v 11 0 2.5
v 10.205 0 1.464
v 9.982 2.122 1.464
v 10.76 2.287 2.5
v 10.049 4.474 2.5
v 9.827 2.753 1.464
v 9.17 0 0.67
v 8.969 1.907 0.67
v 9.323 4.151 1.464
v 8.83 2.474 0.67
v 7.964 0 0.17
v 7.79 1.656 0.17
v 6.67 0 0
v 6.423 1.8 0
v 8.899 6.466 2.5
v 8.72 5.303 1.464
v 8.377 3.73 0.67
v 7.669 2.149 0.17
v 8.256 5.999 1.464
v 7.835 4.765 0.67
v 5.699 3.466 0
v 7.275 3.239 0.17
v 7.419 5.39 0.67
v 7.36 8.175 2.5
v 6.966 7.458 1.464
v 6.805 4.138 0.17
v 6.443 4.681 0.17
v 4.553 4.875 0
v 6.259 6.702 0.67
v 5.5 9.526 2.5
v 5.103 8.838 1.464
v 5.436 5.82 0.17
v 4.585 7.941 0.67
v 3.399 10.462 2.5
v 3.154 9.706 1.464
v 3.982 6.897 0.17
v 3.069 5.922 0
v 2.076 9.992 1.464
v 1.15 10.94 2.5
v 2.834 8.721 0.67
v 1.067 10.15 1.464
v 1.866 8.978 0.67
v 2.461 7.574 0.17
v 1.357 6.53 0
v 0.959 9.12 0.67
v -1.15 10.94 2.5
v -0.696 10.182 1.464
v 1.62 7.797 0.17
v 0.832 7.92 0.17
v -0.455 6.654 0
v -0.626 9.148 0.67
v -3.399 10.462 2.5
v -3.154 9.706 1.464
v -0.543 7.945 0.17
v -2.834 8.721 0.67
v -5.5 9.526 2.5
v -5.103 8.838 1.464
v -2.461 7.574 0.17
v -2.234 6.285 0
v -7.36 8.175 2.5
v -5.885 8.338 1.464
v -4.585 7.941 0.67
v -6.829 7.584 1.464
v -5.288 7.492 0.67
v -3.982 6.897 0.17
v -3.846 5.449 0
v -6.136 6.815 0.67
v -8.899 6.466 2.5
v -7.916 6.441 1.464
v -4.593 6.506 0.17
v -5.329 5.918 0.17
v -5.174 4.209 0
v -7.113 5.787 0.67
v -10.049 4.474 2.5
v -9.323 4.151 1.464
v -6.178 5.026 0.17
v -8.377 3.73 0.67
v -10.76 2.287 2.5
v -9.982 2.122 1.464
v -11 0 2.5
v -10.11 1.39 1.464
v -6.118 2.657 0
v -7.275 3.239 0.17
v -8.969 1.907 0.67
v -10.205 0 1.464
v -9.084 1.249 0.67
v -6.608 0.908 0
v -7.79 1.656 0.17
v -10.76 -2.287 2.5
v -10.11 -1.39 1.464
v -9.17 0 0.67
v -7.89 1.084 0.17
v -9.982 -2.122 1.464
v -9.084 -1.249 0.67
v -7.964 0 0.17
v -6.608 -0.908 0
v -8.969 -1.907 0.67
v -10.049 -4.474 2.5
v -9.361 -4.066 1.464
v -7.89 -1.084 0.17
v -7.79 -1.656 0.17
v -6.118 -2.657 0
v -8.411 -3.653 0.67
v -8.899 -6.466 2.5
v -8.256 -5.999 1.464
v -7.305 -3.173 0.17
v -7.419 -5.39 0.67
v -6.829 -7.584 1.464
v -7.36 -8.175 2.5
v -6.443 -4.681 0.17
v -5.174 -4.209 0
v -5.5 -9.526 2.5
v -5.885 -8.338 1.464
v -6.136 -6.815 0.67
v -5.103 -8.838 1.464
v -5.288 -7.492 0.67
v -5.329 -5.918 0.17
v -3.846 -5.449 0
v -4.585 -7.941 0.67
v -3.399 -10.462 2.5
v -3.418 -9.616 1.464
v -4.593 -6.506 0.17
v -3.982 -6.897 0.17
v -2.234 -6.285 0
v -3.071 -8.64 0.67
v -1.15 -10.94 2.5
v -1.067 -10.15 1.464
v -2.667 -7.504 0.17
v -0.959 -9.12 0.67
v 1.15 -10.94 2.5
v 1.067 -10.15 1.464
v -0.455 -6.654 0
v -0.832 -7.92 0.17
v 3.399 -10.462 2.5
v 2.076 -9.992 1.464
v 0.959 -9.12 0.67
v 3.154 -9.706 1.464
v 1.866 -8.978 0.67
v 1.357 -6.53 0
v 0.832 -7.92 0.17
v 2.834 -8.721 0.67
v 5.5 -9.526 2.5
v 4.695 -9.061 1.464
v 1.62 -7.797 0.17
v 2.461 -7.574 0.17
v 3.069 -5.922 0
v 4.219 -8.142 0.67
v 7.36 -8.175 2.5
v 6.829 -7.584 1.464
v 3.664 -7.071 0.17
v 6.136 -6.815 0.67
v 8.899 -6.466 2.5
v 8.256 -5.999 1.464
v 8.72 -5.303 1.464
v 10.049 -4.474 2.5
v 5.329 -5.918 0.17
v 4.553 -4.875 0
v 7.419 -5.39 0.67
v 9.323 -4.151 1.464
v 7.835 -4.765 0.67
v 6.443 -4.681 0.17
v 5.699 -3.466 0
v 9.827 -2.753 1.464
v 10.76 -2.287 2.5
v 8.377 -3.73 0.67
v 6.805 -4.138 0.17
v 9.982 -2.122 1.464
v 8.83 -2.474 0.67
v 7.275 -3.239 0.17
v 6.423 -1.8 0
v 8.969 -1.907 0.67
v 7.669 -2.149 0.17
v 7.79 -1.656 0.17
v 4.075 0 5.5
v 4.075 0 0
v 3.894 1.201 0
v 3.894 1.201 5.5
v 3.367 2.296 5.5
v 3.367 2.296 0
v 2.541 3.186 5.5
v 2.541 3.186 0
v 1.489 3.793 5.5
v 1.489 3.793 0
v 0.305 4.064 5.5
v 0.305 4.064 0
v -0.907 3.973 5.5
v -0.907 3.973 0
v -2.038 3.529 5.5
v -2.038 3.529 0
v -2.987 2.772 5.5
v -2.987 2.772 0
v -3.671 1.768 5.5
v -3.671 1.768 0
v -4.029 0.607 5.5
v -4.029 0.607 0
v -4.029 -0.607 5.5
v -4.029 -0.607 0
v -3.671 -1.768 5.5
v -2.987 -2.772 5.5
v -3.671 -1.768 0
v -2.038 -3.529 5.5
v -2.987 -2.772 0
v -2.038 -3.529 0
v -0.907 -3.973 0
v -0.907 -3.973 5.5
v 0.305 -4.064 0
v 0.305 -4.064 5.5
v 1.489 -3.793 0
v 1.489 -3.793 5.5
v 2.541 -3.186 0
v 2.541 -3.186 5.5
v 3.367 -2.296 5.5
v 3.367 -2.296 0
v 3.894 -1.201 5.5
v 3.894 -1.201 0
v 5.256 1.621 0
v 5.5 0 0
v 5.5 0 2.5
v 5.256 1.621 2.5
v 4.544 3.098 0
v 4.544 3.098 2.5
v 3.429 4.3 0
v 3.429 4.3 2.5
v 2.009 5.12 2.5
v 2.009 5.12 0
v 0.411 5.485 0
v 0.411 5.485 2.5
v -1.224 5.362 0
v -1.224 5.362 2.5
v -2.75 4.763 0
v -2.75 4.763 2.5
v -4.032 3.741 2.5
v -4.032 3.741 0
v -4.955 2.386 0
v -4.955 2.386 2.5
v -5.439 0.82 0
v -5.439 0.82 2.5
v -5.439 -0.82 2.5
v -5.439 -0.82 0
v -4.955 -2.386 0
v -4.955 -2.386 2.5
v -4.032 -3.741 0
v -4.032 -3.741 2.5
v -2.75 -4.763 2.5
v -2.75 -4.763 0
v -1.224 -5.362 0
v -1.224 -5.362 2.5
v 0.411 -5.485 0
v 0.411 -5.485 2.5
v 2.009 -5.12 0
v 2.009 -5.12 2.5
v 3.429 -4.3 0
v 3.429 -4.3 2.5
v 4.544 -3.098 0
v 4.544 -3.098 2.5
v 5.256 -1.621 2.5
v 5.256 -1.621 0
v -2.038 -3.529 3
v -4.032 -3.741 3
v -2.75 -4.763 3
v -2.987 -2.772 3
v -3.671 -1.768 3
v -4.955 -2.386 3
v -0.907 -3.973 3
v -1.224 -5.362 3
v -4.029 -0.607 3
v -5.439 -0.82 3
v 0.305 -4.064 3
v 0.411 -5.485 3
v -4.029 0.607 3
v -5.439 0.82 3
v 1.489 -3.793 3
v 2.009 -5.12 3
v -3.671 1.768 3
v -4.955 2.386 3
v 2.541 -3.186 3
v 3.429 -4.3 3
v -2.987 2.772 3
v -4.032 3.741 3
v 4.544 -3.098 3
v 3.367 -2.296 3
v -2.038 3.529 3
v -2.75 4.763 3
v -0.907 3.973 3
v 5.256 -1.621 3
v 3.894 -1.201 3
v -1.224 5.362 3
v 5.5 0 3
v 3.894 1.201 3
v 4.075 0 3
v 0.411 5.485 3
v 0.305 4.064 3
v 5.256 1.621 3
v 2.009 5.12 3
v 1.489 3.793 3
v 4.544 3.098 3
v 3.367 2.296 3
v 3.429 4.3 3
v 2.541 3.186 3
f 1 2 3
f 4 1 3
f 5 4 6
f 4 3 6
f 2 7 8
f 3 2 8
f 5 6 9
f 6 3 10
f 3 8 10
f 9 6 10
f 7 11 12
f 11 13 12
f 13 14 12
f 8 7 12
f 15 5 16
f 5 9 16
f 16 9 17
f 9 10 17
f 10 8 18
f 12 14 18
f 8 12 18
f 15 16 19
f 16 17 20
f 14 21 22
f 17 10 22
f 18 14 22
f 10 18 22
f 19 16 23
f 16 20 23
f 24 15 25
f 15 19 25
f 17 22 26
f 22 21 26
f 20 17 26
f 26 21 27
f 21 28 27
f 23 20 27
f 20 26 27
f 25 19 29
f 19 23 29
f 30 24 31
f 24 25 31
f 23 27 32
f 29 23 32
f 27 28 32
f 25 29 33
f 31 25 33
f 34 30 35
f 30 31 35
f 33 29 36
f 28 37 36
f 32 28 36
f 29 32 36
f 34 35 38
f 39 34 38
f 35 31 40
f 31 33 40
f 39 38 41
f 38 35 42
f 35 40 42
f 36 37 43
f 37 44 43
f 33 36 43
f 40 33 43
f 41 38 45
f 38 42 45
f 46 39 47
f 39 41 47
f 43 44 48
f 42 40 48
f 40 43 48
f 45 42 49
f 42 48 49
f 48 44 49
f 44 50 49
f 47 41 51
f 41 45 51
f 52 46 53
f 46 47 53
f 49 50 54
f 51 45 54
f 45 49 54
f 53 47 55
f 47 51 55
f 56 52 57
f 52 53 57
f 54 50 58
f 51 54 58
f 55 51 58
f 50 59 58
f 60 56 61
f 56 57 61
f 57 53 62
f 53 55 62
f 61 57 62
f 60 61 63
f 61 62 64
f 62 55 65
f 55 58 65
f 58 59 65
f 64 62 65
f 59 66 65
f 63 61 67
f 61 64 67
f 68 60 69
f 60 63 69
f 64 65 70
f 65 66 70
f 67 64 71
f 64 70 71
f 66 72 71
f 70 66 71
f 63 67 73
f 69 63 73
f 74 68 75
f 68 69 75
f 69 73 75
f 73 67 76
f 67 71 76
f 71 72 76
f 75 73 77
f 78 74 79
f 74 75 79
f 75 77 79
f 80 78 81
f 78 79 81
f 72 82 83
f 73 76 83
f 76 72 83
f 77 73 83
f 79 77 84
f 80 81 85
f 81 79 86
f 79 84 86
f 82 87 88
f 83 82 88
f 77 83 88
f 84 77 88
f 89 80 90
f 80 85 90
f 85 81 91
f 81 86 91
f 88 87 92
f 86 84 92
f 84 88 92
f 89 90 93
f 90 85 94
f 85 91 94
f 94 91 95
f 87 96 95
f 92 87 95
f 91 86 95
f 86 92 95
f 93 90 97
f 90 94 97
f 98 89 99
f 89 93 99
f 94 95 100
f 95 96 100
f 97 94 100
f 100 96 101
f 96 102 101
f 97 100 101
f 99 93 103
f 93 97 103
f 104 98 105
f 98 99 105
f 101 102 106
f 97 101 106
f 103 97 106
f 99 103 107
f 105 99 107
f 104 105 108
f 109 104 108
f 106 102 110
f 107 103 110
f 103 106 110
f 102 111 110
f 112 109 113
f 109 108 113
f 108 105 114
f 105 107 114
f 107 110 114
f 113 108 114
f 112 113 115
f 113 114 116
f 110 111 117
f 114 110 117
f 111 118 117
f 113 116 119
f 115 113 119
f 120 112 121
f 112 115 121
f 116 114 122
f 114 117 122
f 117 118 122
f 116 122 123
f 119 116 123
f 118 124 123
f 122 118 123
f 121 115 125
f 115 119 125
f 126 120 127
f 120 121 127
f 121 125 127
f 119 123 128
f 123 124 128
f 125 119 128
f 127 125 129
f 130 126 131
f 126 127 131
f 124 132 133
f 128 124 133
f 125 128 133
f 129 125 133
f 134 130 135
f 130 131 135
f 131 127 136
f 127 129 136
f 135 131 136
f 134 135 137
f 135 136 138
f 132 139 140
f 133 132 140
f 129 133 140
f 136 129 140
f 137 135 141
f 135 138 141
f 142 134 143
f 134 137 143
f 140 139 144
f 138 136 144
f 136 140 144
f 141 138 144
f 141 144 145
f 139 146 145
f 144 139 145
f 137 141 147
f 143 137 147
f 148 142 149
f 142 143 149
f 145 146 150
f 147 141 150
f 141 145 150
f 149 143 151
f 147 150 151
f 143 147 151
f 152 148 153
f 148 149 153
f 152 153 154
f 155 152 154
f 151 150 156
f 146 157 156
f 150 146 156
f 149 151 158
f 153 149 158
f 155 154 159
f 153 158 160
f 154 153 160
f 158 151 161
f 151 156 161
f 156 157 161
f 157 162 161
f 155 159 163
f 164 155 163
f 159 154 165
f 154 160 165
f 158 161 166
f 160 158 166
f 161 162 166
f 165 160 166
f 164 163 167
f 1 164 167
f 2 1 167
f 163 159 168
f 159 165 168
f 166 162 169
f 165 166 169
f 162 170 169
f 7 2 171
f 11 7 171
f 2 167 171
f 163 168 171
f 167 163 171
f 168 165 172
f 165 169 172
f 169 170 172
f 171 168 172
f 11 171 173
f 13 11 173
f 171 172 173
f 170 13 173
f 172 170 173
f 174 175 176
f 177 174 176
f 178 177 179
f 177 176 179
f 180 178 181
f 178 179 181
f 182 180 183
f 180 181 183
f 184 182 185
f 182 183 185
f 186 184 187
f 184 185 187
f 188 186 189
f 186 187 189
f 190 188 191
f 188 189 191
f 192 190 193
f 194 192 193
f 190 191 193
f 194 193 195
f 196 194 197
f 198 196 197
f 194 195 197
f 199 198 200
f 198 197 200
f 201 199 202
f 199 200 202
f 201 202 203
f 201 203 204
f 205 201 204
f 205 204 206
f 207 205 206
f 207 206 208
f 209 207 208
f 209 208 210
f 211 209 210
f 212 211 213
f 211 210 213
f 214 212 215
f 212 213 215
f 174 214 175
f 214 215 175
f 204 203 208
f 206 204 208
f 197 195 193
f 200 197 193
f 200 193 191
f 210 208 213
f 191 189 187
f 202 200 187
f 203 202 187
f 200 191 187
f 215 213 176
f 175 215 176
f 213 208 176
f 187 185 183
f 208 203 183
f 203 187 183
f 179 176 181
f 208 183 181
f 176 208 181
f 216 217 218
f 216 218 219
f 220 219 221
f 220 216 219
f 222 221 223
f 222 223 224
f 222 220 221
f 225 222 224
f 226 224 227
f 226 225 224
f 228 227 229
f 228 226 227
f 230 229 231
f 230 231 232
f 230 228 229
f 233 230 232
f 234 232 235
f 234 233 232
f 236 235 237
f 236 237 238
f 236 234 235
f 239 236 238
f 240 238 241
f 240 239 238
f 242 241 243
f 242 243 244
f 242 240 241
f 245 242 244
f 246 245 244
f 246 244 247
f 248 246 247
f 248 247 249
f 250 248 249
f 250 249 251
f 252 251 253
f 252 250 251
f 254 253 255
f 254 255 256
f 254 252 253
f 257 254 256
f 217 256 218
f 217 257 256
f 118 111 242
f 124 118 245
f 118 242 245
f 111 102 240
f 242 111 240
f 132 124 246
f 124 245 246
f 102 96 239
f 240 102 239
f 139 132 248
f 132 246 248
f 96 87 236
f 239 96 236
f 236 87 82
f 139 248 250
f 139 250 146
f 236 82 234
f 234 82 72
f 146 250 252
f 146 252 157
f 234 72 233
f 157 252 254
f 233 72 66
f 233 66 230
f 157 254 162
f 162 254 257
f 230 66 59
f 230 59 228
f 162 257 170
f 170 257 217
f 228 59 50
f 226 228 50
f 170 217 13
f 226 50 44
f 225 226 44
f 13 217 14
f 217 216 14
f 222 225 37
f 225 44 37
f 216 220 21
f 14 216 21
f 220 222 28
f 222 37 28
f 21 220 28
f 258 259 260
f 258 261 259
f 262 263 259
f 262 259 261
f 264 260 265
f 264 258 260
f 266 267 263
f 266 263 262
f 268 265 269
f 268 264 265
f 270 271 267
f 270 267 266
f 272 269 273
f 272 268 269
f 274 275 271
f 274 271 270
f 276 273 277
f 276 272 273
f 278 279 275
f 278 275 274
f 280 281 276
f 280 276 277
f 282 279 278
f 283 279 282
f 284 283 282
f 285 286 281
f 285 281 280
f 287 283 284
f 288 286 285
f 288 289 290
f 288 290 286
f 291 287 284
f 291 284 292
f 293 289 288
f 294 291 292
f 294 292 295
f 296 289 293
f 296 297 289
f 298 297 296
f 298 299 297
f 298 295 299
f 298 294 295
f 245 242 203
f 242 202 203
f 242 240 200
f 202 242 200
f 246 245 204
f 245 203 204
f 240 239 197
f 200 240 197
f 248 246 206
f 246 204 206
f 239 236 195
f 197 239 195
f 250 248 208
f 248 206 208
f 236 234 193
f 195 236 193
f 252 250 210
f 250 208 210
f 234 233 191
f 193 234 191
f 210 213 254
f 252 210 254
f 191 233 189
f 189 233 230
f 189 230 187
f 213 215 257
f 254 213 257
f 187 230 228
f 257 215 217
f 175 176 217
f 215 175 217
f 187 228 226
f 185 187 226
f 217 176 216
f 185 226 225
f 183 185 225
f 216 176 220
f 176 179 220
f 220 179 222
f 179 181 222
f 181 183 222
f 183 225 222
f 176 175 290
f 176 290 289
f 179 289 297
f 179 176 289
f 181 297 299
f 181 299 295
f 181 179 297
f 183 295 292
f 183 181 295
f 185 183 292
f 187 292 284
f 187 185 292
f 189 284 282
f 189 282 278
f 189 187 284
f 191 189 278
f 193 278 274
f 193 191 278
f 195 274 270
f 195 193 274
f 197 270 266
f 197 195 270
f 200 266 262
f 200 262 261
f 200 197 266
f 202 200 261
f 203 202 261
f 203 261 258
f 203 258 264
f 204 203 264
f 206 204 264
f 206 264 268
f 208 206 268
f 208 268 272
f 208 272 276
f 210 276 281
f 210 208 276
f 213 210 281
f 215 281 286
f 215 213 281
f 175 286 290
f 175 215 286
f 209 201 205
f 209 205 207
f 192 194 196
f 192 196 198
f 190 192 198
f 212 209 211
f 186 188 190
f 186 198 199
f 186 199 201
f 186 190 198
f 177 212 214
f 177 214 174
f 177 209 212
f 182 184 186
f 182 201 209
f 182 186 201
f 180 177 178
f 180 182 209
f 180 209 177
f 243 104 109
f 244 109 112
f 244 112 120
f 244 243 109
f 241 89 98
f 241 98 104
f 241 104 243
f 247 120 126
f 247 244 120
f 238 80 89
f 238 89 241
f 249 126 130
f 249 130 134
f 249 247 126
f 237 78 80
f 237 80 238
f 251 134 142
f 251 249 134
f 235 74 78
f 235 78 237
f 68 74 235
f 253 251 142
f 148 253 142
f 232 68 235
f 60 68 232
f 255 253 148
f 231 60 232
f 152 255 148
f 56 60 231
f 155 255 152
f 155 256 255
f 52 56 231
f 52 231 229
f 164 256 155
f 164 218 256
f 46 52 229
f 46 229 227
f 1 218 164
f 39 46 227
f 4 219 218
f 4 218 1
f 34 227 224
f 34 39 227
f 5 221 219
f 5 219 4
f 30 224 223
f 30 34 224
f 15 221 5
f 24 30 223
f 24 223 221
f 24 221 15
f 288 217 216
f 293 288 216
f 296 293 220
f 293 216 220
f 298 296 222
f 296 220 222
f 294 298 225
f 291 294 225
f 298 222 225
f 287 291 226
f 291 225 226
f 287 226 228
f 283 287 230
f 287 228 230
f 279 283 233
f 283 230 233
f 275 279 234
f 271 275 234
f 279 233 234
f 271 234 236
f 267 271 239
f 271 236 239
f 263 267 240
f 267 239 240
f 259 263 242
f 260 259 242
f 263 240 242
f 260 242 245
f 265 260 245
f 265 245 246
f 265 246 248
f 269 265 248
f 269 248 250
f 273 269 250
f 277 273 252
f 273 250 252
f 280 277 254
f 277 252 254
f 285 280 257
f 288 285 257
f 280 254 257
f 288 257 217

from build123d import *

# Parameters (mm, degrees)
F0_R     = 4.075
F1_DEPTH = 5.5
F0_R_2   = 11
F0_R_3   = 5.5
F2_DEPTH = 2.5
F3_DEPTH = 3


# Not quite as in the source:
# - a fillet or chamfer that OpenCascade refuses, or shapes differently, is made with other operations: its cross-section is extruded or revolved along the edge and cut away or added


with BuildPart() as f1:
    # F0 (on Top) → F1 (new body)
    with BuildSketch(Plane.XY):
        Circle(F0_R)
    extrude(amount=F1_DEPTH)


with BuildPart() as f2:
    # F0 (on Top) → F2 (new body)
    with BuildSketch(Plane.XY):
        Circle(F0_R_2)
        Circle(F0_R_3, mode=Mode.SUBTRACT)
    extrude(amount=F2_DEPTH)

    # F4: fillet of radius 5 on 1 edges, made by hand

    # F4_s1 → F4_t2 (revolve, cut)
    with BuildSketch(Plane.XZ):
        with BuildLine():
            ThreePointArc((11, 2.5), (9.1698729811, 0.6698729811), (6.6698729811, 0))
            Line((6.6698729811, 0), (11, 0))
            Line((11, 0), (11, 2.5))
        make_face()
    revolve(axis=Axis((0, 0, 0), (0, 0, 1)), mode=Mode.SUBTRACT)


with BuildPart() as f3:
    # F0 (on Top) → F3 (new body)
    with BuildSketch(Plane.XY):
        Circle(F0_R_3)
        Circle(F0_R, mode=Mode.SUBTRACT)
    extrude(amount=F3_DEPTH)


solid = Compound([f1.part, f2.part, f3.part])
